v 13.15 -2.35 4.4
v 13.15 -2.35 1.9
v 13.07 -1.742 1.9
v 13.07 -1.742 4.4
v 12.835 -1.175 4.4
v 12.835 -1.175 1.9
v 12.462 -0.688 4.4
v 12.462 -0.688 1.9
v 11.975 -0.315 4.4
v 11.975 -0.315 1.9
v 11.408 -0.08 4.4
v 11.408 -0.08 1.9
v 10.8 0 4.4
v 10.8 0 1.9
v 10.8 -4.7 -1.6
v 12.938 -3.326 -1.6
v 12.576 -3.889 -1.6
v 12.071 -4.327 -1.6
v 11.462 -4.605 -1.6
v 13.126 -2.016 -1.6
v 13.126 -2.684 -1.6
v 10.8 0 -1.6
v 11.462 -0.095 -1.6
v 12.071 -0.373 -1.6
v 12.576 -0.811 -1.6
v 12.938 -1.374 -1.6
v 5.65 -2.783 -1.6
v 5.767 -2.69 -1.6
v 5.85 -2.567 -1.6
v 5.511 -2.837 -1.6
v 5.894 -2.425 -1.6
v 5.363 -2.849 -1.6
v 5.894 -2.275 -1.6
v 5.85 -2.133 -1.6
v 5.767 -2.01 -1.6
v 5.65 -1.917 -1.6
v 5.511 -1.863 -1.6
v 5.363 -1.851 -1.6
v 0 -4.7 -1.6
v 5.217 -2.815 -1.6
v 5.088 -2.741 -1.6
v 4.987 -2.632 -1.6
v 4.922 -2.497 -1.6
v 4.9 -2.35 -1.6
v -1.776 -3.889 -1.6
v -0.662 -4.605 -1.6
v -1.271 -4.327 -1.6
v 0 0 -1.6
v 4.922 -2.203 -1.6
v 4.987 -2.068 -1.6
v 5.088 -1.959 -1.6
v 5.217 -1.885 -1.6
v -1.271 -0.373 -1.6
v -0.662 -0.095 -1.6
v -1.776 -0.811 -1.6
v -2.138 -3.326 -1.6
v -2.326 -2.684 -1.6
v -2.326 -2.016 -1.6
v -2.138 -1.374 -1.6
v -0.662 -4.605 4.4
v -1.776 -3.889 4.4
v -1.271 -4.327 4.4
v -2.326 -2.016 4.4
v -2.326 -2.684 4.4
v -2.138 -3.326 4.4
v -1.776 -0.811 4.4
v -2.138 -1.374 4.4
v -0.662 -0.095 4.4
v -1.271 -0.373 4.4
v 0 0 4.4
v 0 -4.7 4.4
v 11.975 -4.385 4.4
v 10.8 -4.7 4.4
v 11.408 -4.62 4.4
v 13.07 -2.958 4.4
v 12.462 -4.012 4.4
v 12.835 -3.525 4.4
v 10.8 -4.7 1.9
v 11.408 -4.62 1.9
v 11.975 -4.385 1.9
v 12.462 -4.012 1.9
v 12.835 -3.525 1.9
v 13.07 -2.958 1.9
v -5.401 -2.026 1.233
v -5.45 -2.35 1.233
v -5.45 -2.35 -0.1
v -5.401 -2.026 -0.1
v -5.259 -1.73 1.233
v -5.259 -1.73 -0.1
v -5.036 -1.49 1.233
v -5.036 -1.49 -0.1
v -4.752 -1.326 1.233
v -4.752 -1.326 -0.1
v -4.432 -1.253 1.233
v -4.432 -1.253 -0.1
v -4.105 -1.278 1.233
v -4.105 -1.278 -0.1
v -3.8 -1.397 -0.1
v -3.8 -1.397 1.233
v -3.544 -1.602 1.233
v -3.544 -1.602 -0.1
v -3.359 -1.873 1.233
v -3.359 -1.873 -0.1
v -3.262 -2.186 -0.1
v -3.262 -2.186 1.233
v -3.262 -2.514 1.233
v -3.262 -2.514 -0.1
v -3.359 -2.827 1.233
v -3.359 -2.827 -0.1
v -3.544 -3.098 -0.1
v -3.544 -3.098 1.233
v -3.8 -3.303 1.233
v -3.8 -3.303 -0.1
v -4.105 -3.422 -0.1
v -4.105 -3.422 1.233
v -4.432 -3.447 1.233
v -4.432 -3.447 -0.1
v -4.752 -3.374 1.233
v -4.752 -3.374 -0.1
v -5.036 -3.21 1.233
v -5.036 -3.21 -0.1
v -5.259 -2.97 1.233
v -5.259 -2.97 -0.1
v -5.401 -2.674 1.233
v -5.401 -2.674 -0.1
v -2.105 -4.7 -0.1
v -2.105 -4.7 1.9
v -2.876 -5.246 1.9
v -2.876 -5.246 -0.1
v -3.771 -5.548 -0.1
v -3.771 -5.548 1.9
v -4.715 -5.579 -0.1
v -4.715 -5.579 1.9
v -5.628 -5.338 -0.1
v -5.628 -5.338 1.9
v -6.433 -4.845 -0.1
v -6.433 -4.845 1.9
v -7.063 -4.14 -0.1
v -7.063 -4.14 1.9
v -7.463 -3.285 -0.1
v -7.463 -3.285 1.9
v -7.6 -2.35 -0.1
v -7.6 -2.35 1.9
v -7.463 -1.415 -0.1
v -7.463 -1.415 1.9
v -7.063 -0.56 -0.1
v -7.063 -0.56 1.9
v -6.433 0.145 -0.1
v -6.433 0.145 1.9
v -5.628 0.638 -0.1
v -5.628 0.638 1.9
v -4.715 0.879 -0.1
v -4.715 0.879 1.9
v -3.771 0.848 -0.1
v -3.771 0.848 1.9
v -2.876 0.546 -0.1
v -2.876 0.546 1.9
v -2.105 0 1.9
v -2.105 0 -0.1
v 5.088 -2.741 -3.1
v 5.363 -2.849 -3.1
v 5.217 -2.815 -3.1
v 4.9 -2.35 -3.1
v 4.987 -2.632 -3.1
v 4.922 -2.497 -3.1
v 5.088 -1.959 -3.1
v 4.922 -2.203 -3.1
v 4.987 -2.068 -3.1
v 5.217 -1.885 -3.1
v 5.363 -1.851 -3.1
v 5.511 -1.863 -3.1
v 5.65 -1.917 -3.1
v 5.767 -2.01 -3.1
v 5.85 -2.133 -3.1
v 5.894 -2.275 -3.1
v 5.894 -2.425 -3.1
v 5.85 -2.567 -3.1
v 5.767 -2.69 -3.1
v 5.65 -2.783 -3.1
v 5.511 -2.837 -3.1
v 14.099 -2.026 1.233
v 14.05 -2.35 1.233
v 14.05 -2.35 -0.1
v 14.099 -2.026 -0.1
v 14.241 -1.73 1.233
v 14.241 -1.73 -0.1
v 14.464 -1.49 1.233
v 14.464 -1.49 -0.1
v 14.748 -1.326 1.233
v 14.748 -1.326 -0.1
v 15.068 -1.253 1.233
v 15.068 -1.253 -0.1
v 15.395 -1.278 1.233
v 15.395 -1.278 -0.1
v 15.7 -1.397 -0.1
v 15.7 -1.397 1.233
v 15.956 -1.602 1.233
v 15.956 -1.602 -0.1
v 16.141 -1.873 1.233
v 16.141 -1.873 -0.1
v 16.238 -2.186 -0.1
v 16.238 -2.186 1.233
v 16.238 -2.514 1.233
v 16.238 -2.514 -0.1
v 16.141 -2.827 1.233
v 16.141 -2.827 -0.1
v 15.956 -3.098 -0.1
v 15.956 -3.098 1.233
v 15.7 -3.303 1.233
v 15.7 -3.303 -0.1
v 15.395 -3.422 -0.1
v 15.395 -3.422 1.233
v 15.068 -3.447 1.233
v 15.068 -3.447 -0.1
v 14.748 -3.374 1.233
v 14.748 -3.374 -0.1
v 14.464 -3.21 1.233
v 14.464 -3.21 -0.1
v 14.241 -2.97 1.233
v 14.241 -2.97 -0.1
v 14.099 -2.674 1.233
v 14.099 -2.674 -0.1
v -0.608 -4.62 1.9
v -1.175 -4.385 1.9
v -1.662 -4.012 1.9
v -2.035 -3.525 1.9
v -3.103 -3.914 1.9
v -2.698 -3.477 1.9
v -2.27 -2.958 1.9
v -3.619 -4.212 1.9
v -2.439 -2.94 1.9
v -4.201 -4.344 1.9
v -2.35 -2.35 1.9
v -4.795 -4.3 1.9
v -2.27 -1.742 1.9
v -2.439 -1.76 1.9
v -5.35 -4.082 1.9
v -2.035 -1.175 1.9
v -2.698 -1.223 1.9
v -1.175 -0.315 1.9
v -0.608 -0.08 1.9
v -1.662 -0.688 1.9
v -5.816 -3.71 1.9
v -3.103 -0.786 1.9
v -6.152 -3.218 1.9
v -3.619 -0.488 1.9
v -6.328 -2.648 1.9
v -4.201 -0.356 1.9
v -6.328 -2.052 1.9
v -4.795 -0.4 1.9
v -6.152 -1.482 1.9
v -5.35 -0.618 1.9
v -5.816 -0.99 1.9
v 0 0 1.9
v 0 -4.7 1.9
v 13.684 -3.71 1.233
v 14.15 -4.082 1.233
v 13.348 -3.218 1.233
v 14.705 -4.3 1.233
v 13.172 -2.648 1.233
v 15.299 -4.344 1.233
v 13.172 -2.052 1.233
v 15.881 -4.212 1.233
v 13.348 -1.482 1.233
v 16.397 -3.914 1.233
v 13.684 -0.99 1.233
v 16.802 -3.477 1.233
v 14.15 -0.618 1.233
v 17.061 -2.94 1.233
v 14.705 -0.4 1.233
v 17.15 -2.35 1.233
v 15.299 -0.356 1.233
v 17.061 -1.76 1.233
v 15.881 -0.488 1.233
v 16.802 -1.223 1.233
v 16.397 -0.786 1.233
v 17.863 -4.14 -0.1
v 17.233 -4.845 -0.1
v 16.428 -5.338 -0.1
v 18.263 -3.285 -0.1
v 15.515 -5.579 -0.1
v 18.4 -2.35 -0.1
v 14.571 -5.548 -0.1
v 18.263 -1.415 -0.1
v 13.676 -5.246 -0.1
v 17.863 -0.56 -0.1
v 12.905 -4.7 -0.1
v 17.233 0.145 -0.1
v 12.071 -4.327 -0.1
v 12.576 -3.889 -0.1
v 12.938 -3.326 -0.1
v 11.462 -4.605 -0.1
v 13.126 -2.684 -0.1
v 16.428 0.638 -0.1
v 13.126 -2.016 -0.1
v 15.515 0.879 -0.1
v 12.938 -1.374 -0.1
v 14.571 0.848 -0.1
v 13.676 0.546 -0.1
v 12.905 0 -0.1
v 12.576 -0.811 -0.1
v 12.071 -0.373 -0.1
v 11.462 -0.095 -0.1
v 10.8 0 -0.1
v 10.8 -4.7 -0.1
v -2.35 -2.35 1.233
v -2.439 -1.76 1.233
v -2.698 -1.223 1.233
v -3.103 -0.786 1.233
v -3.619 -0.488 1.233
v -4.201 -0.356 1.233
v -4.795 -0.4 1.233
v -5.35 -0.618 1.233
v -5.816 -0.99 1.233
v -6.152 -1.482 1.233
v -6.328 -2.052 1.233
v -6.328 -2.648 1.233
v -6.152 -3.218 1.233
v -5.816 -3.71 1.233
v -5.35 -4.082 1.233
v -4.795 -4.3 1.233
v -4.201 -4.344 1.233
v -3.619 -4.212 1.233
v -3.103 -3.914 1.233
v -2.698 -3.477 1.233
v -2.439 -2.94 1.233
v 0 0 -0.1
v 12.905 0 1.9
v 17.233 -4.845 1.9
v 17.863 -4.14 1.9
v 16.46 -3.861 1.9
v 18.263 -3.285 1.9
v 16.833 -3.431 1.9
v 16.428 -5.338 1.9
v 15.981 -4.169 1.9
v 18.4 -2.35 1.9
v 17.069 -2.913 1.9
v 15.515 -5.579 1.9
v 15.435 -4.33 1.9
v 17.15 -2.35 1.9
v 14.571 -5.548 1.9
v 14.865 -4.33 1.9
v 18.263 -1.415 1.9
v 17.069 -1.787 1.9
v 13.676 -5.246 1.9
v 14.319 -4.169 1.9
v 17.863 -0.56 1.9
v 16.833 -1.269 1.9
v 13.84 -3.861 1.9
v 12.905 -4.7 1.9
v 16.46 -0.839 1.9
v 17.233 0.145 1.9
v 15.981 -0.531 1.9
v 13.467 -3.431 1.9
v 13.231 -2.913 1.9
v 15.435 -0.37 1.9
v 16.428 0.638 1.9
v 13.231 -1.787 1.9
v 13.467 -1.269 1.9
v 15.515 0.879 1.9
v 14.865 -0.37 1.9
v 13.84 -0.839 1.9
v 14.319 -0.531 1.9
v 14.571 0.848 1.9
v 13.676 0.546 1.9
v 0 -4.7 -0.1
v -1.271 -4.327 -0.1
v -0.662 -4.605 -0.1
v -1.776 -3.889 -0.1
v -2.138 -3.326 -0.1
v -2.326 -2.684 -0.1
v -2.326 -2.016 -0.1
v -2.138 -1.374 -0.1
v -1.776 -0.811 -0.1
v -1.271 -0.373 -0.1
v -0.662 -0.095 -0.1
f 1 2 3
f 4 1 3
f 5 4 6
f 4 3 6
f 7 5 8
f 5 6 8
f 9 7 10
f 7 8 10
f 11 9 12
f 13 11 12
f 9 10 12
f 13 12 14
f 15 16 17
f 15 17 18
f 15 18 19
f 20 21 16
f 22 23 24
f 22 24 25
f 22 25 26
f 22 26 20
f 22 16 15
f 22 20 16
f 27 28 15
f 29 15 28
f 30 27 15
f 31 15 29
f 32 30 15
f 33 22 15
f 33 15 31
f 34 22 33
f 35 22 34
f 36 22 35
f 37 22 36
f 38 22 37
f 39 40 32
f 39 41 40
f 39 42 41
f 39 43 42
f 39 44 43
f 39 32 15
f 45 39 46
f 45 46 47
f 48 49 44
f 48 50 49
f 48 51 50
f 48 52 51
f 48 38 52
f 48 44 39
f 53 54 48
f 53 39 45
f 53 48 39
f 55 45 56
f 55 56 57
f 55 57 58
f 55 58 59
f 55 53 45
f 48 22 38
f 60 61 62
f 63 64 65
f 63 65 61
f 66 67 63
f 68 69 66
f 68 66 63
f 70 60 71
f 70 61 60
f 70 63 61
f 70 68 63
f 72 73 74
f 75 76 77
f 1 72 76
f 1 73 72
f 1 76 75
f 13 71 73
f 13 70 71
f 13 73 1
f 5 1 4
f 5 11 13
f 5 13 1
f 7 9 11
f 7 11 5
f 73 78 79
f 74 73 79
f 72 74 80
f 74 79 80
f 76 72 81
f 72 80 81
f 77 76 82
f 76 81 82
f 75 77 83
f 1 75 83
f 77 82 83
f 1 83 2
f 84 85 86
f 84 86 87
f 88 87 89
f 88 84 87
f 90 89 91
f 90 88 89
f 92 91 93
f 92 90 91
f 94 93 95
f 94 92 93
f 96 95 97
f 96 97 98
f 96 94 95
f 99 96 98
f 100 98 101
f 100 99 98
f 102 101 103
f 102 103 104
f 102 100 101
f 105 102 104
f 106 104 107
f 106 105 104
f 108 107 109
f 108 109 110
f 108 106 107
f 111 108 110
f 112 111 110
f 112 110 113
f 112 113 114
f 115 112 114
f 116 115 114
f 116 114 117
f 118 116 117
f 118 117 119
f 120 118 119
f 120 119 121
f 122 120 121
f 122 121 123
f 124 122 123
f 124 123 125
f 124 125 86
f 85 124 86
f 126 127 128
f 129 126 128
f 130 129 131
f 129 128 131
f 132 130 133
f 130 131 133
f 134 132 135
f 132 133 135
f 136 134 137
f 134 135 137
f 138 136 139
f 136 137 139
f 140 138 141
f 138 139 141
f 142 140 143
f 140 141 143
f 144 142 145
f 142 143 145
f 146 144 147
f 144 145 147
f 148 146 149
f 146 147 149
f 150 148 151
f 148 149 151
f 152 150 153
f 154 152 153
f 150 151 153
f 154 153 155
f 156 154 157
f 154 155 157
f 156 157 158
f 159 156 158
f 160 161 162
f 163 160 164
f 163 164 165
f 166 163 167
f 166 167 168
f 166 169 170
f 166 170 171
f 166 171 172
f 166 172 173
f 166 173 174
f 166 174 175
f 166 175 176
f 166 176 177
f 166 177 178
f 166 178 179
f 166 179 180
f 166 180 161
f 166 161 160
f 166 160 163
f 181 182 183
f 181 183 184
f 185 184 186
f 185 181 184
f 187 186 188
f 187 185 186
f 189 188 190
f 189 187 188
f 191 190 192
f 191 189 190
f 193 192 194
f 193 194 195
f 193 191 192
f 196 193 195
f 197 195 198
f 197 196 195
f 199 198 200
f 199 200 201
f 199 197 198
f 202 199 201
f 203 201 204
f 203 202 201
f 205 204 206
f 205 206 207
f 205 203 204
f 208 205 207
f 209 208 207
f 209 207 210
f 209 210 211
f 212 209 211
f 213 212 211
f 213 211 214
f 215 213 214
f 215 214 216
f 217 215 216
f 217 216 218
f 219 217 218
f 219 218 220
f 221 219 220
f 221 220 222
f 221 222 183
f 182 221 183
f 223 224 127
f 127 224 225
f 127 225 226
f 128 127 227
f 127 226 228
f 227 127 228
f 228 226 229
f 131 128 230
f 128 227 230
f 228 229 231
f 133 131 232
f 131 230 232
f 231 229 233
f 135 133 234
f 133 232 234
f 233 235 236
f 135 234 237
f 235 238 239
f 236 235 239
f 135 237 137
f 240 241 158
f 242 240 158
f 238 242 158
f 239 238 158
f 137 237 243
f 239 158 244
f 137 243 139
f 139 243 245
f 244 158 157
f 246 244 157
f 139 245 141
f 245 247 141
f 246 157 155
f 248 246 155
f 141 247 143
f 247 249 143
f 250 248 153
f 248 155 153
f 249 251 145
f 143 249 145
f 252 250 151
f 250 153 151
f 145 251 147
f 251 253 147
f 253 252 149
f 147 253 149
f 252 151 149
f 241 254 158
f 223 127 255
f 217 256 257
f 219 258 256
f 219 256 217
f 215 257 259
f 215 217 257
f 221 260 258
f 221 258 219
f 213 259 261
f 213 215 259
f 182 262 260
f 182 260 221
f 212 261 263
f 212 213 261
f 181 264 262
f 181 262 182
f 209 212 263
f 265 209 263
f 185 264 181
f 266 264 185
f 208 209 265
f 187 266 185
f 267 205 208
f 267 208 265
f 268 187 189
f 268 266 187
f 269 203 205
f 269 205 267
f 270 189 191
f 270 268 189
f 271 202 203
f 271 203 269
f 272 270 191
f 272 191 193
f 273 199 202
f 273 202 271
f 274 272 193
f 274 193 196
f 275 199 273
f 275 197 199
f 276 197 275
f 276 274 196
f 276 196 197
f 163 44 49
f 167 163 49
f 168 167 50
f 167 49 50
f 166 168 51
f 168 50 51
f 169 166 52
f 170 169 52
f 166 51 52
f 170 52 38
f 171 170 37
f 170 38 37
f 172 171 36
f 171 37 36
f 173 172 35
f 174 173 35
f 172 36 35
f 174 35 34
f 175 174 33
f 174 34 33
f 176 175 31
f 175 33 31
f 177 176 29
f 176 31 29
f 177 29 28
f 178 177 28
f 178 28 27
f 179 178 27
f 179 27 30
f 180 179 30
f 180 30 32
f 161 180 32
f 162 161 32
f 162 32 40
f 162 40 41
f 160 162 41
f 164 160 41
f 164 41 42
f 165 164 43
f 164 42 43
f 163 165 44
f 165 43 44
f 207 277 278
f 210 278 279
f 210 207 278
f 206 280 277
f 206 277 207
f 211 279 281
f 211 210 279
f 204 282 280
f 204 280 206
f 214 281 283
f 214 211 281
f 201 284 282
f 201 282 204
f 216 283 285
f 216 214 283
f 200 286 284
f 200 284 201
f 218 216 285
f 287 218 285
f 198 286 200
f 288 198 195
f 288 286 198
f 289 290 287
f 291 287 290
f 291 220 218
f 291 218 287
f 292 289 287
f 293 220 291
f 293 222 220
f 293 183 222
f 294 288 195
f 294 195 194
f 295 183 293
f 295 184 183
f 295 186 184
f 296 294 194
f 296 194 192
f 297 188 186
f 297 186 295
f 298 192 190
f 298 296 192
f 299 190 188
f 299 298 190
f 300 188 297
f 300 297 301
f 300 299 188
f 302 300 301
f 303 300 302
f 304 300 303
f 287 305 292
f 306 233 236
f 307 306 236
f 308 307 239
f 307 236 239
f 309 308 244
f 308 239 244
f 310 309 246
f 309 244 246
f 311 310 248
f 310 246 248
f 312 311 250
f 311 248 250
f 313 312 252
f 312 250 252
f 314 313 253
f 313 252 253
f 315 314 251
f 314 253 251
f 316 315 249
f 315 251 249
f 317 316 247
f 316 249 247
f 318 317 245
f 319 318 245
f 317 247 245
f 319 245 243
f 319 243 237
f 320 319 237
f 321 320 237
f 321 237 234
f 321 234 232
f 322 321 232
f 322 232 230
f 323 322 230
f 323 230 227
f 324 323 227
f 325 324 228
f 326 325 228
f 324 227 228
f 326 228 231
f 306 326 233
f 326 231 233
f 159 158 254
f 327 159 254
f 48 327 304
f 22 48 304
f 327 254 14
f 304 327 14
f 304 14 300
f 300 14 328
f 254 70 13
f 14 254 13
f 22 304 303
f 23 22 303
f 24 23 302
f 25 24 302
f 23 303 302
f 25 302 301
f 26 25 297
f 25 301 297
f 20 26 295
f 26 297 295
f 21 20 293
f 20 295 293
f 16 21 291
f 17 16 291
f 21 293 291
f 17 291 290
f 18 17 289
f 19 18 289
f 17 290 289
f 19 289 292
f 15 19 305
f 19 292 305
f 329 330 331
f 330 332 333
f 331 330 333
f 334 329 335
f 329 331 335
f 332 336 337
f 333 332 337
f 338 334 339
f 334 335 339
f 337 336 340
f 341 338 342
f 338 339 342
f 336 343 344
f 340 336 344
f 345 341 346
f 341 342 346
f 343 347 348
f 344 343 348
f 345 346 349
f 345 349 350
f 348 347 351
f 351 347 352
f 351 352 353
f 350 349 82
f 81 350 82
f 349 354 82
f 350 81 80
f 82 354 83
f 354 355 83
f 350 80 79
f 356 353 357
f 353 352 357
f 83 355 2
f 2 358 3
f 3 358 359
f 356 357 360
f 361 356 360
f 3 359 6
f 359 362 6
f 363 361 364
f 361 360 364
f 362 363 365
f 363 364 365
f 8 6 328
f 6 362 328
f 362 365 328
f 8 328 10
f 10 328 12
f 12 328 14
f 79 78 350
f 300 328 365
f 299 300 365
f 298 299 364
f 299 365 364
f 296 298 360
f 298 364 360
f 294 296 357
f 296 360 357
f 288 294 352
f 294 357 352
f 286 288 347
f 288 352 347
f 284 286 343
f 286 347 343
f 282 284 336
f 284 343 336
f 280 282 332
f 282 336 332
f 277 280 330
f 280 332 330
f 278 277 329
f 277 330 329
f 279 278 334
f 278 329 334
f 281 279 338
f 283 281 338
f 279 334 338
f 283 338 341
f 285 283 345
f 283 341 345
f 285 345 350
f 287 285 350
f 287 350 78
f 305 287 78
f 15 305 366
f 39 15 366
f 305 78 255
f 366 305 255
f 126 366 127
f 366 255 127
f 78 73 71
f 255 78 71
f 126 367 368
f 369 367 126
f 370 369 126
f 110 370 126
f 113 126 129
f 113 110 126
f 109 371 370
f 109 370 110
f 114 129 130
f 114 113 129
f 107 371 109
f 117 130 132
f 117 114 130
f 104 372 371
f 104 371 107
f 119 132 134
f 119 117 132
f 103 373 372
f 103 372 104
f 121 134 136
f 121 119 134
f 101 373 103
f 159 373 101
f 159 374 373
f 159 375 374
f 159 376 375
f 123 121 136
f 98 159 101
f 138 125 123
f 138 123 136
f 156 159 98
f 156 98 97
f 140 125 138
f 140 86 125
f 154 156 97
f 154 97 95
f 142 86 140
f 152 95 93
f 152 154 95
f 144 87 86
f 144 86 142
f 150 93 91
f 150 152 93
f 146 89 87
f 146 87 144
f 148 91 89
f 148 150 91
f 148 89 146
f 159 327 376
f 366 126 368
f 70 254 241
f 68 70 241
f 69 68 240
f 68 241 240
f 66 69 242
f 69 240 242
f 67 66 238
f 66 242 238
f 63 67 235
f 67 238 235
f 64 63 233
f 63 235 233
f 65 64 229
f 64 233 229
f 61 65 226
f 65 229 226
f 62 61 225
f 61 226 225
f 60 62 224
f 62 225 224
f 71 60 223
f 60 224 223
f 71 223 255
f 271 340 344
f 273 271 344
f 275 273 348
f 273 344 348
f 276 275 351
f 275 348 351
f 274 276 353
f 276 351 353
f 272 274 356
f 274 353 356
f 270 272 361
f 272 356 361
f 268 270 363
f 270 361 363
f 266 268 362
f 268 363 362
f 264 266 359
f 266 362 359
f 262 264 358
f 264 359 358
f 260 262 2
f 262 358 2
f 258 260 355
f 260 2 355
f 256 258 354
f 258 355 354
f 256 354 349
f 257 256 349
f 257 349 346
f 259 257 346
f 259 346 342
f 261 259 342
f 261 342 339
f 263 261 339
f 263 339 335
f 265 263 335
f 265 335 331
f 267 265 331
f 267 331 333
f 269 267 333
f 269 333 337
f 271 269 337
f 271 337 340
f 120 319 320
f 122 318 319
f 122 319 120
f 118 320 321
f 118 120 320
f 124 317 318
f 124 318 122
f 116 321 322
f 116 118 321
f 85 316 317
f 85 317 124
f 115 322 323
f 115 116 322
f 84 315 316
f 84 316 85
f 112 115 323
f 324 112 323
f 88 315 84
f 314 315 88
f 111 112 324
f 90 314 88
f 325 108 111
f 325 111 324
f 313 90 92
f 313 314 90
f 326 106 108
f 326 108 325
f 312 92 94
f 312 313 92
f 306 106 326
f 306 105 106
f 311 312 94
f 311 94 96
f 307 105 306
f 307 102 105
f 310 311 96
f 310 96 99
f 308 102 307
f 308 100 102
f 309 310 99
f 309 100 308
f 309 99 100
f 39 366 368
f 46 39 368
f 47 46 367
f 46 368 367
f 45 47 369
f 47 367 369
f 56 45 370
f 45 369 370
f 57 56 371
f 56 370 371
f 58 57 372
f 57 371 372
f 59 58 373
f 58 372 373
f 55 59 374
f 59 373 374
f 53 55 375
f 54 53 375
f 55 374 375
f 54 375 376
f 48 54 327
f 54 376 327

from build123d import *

# Parameters (mm, degrees)
EXTRUDE_4_DEPTH     = 2.5
SKETCH_5_R          = 1.1
EXTRUDE_5_DEPTH     = 2
SKETCH_6_R          = 2
CUT_EXTRUDE_1_DEPTH = 0.666666667
SKETCH_7_R          = 2.35
SKETCH_7_W          = 10.8
SKETCH_7_H          = 4.7
EXTRUDE_6_DEPTH     = 1.5
SKETCH_8_R          = 0.5
EXTRUDE_7_DEPTH     = 1.5


with BuildPart() as part:
    # Эскиз4 → Бобышка-Вытянуть4 (new body)
    with BuildSketch(Plane.XY.offset(1.9)):
        with BuildLine():
            ThreePointArc((0, 0), (-2.35, -2.35), (0, -4.7))
            Line((0, -4.7), (0, 0))
        make_face()
        with BuildLine():
            Line((0, 0), (0, -4.7))
            ThreePointArc((0, -4.7), (1.661700936, -4.011700936), (2.35, -2.35))
            ThreePointArc((2.35, -2.35), (1.661700936, -0.688299064), (0, 0))
        make_face()
        with BuildLine():
            ThreePointArc((2.35, -2.35), (1.661700936, -4.011700936), (0, -4.7))
            Line((0, -4.7), (10.8, -4.7))
            ThreePointArc((10.8, -4.7), (8.45, -2.35), (10.8, 0))
            Line((10.8, 0), (0, 0))
            ThreePointArc((0, 0), (1.661700936, -0.688299064), (2.35, -2.35))
        make_face()
        with BuildLine():
            ThreePointArc((10.8, 0), (8.45, -2.35), (10.8, -4.7))
            Line((10.8, -4.7), (10.8, 0))
        make_face()
        with BuildLine():
            Line((10.8, 0), (10.8, -4.7))
            ThreePointArc((10.8, -4.7), (12.461700936, -4.011700936), (13.15, -2.35))
            ThreePointArc((13.15, -2.35), (12.461700936, -0.688299064), (10.8, 0))
        make_face()
    extrude(amount=EXTRUDE_4_DEPTH)

    # Эскиз5 → Бобышка-Вытянуть5 (add)
    with BuildSketch(Plane(origin=(0, 0, 1.9), x_dir=(-1, 0, 0), z_dir=(0, 0, -1))):
        with BuildLine():
            ThreePointArc((-12.905005568, 0), (-18.4, -2.35), (-12.905005568, -4.7))
            Line((-12.905005568, -4.7), (2.105005568, -4.7))
            ThreePointArc((2.105005568, -4.7), (7.6, -2.35), (2.105005568, 0))
            Line((2.105005568, 0), (-12.905005568, 0))
        make_face()
        with Locations((-15.15, -2.35)):
            Circle(SKETCH_5_R, mode=Mode.SUBTRACT)
        with Locations((4.35, -2.35)):
            Circle(SKETCH_5_R, mode=Mode.SUBTRACT)
    extrude(amount=EXTRUDE_5_DEPTH)

    # Эскиз6 → Вырез-Вытянуть1 (cut)
    with BuildSketch(Plane.XY.offset(1.9)):
        with Locations((15.15, -2.35)):
            Circle(SKETCH_6_R)
        with Locations((-4.35, -2.35)):
            Circle(SKETCH_6_R)
    extrude(amount=-CUT_EXTRUDE_1_DEPTH, mode=Mode.SUBTRACT)

    # Эскиз7 → Бобышка-Вытянуть6 (add)
    with BuildSketch(Plane(origin=(0, 0, -0.1), x_dir=(-1, 0, 0), z_dir=(0, 0, -1))):
        with Locations((-10.8, -2.35)):
            Circle(SKETCH_7_R)
        with Locations((0, -2.35)):
            Circle(SKETCH_7_R)
        with Locations((-5.4, -2.35)):
            Rectangle(SKETCH_7_W, SKETCH_7_H)
    extrude(amount=EXTRUDE_6_DEPTH)

    # Эскиз8 → Бобышка-Вытянуть7 (add)
    with BuildSketch(Plane(origin=(0, 0, -1.6), x_dir=(-1, 0, 0), z_dir=(0, 0, -1))):
        with Locations((-5.4, -2.35)):
            Circle(SKETCH_8_R)
    extrude(amount=EXTRUDE_7_DEPTH)


solid = part.part
